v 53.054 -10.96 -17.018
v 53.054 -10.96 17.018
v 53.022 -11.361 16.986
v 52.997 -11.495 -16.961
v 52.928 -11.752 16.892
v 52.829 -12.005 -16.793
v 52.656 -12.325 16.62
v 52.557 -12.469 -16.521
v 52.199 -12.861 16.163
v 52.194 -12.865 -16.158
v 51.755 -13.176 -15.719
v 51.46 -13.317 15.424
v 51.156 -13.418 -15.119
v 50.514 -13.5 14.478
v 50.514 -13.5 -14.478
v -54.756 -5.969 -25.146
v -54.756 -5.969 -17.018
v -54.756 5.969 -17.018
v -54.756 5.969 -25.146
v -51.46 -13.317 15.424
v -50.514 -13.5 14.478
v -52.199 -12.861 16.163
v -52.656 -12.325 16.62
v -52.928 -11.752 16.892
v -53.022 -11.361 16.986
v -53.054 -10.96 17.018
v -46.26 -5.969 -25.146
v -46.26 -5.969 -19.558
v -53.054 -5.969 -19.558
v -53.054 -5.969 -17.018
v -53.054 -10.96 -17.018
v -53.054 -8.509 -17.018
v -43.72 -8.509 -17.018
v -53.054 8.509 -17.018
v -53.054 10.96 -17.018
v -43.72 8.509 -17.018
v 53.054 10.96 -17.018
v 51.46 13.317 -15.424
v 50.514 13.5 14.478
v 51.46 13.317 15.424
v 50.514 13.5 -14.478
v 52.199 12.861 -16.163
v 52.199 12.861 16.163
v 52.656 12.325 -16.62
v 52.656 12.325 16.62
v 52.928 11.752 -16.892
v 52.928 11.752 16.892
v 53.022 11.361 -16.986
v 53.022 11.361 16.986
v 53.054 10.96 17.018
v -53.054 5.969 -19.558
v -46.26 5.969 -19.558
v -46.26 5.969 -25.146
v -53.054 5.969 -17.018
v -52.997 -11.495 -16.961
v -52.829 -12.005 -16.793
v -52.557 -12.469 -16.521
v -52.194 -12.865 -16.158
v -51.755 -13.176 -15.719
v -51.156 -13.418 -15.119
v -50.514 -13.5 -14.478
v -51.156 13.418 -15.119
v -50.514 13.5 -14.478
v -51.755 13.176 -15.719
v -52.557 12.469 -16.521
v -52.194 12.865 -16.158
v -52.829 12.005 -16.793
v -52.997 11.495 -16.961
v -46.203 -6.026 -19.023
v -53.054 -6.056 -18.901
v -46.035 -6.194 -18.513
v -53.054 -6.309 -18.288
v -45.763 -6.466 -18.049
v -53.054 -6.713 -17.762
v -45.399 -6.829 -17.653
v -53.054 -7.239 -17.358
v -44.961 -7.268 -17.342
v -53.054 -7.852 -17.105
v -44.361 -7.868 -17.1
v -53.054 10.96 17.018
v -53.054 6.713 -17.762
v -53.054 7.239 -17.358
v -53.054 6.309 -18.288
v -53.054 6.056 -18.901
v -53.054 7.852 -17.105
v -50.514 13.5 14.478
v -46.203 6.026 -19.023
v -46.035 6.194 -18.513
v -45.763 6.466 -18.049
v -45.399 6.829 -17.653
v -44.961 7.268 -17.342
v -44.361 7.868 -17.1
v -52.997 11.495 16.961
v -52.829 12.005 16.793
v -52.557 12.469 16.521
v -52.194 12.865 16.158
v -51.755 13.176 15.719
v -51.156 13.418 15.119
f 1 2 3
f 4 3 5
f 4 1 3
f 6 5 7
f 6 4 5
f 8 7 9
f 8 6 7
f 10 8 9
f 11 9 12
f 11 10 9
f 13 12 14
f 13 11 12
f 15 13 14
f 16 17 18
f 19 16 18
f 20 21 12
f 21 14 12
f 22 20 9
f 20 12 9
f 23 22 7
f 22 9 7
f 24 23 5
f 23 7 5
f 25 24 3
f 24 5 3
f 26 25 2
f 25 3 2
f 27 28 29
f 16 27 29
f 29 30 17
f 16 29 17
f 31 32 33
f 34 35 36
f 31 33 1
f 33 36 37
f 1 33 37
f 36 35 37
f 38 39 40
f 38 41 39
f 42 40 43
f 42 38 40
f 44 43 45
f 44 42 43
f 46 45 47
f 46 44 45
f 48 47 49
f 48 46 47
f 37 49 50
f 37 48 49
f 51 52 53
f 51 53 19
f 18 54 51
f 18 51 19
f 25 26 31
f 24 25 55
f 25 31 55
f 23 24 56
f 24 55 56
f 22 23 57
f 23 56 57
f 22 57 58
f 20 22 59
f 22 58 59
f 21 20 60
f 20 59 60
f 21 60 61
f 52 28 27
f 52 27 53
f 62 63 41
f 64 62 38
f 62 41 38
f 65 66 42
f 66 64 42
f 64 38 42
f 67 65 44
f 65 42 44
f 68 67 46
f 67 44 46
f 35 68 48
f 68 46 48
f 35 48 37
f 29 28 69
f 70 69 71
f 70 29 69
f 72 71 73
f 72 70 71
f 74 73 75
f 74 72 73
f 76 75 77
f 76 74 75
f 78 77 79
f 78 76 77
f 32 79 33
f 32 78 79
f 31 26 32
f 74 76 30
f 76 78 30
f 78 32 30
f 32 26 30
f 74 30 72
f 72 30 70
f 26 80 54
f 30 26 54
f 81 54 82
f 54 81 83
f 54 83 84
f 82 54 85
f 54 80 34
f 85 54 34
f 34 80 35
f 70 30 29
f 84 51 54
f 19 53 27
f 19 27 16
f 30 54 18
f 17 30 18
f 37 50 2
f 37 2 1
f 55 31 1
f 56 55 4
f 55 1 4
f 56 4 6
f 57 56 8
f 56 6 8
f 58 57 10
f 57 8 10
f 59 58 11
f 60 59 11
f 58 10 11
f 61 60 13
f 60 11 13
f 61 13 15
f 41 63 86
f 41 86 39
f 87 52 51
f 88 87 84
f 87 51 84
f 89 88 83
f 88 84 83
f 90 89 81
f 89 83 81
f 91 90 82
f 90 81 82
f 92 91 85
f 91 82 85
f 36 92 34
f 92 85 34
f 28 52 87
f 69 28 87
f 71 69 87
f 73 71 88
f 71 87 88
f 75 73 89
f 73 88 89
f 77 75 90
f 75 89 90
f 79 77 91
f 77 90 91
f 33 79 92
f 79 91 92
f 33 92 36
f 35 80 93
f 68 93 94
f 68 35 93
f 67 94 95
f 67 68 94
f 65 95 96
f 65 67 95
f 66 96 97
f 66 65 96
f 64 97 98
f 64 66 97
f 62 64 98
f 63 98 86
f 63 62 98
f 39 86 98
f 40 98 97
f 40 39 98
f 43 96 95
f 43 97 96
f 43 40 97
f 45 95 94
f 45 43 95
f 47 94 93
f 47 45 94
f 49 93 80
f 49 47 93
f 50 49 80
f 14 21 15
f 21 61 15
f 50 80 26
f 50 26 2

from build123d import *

# Parameters (mm, degrees)
SKETCH1_W           = 106.1085
SKETCH1_H           = 34.036
BOSS_EXTRUDE1_DEPTH = 13.5001
FILLET1_R           = 2.54
SKETCH4_W           = 8.4963
SKETCH4_H           = 11.938
BOSS_EXTRUDE2_DEPTH = 8.128
FILLET2_R           = 2.54


with BuildPart() as part:
    # Sketch1 → Boss-Extrude1 (new, symmetric)
    with BuildSketch(Plane(origin=(0, 0, 0), x_dir=(1, 0, 0), z_dir=(0, 1, 0))):
        Rectangle(SKETCH1_W, SKETCH1_H)
    extrude(amount=BOSS_EXTRUDE1_DEPTH, both=True)

    # Fillet1
    fillet1_edges = [part.edges().sort_by_distance(p)[0] for p in [
        (-53.05425, 13.5001, 0),
        (0, 13.5001, 17.018),
        (53.05425, 13.5001, 0),
        (0, -13.5001, 17.018),
        (-53.05425, -13.5001, 0),
        (0, -13.5001, -17.018),
        (53.05425, -13.5001, 0),
        (0, 13.5001, -17.018),
    ]]
    fillet(fillet1_edges, radius=FILLET1_R)

    # Sketch4 → Boss-Extrude2 (add)
    with BuildSketch(Plane(origin=(0, 0, -17.018), x_dir=(-1, 0, 0), z_dir=(0, 0, -1))):
        with Locations((50.5079, 0)):
            Rectangle(SKETCH4_W, SKETCH4_H)
    extrude(amount=BOSS_EXTRUDE2_DEPTH)

    # Fillet2
    fillet2_edges = [part.edges().sort_by_distance(p)[0] for p in [
        (-49.657, 5.969, -17.018),
        (-46.25975, 0, -17.018),
        (-49.657, -5.969, -17.018),
    ]]
    fillet(fillet2_edges, radius=FILLET2_R)


solid = part.part
